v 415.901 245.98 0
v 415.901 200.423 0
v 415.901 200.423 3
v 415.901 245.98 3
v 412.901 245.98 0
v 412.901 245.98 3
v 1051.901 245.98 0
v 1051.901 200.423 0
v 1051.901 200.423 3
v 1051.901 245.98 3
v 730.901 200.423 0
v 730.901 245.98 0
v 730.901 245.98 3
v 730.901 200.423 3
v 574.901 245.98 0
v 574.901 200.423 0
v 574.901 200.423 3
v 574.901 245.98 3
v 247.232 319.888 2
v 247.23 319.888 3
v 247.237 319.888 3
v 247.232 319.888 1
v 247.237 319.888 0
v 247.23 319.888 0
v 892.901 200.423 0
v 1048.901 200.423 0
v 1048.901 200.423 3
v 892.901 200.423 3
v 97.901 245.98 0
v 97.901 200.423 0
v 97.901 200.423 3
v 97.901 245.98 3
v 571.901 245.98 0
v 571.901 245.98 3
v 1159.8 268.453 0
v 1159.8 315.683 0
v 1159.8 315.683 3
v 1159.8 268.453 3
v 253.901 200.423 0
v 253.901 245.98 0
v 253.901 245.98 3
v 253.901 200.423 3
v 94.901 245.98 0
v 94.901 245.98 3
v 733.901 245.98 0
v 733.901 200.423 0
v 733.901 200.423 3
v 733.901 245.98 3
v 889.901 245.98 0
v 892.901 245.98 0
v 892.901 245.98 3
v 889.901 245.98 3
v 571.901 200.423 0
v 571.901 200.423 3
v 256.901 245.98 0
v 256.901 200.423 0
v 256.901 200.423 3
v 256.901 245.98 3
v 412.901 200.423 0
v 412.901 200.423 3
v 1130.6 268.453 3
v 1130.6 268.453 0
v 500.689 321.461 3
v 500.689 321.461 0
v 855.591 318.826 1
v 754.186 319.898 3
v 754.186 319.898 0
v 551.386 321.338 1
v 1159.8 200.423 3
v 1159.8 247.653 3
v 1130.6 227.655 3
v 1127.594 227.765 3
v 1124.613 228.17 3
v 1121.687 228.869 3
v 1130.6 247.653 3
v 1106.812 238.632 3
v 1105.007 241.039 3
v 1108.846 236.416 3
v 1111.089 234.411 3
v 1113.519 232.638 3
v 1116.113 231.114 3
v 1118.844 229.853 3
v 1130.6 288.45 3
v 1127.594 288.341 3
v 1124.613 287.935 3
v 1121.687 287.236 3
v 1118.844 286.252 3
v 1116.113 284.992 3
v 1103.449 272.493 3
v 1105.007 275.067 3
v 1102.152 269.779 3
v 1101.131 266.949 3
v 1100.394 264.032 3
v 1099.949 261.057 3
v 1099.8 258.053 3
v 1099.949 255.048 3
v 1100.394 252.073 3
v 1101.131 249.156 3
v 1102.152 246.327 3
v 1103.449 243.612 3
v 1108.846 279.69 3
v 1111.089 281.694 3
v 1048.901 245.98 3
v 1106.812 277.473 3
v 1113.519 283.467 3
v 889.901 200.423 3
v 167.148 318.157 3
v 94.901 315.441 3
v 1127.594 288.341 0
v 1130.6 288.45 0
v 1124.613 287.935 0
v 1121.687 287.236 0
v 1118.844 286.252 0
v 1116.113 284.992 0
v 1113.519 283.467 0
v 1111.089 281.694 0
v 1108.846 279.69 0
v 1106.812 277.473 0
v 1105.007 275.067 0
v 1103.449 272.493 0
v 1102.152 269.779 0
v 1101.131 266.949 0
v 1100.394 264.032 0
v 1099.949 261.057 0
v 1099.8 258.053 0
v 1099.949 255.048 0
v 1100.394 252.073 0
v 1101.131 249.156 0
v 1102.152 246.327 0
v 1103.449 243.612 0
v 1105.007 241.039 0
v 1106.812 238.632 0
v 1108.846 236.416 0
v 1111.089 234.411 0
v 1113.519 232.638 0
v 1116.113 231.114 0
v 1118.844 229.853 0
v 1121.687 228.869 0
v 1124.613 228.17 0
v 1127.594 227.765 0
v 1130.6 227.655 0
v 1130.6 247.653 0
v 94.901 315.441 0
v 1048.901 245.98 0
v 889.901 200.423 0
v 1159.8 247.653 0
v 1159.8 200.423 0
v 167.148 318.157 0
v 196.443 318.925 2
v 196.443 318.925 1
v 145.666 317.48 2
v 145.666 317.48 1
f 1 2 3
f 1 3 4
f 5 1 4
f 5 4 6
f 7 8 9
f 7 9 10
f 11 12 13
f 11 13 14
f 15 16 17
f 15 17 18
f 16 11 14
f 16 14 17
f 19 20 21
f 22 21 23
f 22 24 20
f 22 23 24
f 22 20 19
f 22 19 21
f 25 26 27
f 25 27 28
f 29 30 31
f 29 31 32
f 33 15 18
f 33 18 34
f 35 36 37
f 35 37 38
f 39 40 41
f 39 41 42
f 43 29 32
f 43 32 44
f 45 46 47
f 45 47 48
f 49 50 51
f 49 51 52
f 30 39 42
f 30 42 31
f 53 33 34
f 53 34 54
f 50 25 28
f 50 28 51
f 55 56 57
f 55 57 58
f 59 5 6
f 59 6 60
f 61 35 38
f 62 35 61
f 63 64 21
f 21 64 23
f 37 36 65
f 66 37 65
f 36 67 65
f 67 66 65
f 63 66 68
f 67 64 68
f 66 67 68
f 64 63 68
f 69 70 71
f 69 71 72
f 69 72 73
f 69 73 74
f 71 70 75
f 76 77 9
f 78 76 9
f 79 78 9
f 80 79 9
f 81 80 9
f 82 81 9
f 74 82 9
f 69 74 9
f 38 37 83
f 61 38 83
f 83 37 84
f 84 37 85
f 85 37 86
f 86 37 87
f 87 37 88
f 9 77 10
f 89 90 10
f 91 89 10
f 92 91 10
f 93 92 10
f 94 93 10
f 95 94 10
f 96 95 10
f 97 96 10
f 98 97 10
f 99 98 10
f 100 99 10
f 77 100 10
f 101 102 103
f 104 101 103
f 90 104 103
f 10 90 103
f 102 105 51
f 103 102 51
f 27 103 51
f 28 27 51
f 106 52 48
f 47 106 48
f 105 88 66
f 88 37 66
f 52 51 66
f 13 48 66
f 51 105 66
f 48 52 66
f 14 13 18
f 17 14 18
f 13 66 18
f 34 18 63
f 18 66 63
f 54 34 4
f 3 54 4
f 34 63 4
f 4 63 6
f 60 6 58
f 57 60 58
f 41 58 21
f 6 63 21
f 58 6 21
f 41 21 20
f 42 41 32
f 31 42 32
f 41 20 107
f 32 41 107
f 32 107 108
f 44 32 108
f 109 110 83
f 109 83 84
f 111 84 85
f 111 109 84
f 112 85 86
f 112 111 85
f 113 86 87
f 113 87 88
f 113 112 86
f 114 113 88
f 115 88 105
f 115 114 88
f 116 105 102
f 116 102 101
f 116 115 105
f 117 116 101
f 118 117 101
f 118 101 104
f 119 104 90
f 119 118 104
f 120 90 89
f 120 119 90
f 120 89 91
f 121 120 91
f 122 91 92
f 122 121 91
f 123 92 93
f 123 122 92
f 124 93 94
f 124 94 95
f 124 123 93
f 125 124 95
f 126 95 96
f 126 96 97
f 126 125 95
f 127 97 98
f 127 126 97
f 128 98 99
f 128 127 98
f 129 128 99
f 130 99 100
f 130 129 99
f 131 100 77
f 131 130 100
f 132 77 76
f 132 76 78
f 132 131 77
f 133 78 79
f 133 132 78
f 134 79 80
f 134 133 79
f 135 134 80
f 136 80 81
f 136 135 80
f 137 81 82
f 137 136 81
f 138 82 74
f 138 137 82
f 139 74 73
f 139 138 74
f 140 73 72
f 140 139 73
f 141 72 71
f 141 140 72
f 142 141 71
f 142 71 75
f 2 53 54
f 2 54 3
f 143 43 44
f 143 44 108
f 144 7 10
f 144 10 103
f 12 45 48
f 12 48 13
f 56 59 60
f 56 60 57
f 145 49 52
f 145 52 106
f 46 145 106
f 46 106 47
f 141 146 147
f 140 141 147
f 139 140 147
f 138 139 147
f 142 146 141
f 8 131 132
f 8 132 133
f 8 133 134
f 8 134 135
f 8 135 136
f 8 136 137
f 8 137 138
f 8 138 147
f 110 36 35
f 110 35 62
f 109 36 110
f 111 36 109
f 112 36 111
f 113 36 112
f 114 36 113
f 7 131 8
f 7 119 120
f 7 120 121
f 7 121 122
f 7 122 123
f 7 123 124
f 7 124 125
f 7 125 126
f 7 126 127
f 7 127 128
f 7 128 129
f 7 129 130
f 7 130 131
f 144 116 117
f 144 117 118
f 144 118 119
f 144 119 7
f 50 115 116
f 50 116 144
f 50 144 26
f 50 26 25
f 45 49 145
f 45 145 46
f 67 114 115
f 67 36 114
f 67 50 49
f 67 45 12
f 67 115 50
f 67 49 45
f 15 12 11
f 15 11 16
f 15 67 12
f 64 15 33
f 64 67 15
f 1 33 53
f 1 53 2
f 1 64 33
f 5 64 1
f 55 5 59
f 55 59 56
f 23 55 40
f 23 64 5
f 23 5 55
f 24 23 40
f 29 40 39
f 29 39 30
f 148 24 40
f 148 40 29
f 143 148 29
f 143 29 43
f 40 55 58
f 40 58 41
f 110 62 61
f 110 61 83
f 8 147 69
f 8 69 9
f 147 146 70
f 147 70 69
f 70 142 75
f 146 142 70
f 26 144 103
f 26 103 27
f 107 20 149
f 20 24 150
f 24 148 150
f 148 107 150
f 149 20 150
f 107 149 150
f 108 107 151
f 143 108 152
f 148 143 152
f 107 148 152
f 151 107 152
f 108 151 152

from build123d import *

# Parameters (mm, degrees)
BOSS_EXTRUDE1_DEPTH = 3


with BuildPart() as part:
    # Model → Boss-Extrude1 (new body)
    with BuildSketch(Plane.XY):
        with BuildLine():
            Line((1159.8, 315.682652611), (1159.8, 268.452661621))
            Line((1159.8, 268.452661621), (1130.6, 268.452661621))
            Line((1130.6, 268.452661621), (1130.6, 288.450029928))
            ThreePointArc((1130.6, 288.450029928), (1099.799999997, 258.052661621), (1130.6, 227.655293314))
            Line((1130.6, 227.655293314), (1130.6, 247.652661621))
            Line((1130.6, 247.652661621), (1159.8, 247.652661621))
            Line((1159.8, 247.652661621), (1159.8, 200.422661621))
            Line((1159.8, 200.422661621), (1051.901037795, 200.422661621))
            Line((1051.901037795, 200.422661621), (1051.901037795, 245.979700014))
            Line((1051.901037795, 245.979700014), (1048.901037796, 245.979700014))
            Line((1048.901037796, 245.979700014), (1048.901037796, 200.422661621))
            Line((1048.901037796, 200.422661621), (892.901037795, 200.422661621))
            Line((892.901037795, 200.422661621), (892.901037795, 245.979700014))
            Line((892.901037795, 245.979700014), (889.901037795, 245.979700014))
            Line((889.901037795, 245.979700014), (889.901037795, 200.422661621))
            Line((889.901037795, 200.422661621), (733.901037795, 200.422661621))
            Line((733.901037795, 200.422661621), (733.901037795, 245.979700014))
            Line((733.901037795, 245.979700014), (730.901037795, 245.979700014))
            Line((730.901037795, 245.979700014), (730.901037795, 200.422661621))
            Line((730.901037795, 200.422661621), (574.901037795, 200.422661621))
            Line((574.901037795, 200.422661621), (574.901037795, 245.979700014))
            Line((574.901037795, 245.979700014), (571.901037795, 245.979700014))
            Line((571.901037795, 245.979700014), (571.901037795, 200.422661621))
            Line((571.901037795, 200.422661621), (415.901037795, 200.422661621))
            Line((415.901037795, 200.422661621), (415.901037795, 245.979700014))
            Line((415.901037795, 245.979700014), (412.901037795, 245.979700014))
            Line((412.901037795, 245.979700014), (412.901037795, 200.422661621))
            Line((412.901037795, 200.422661621), (256.901037795, 200.422661621))
            Line((256.901037795, 200.422661621), (256.901037795, 245.979700014))
            Line((256.901037795, 245.979700014), (253.901037796, 245.979700014))
            Line((253.901037796, 245.979700014), (253.901037796, 200.422661621))
            Line((253.901037796, 200.422661621), (97.901037796, 200.422661621))
            Line((97.901037796, 200.422661621), (97.901037796, 245.979700014))
            Line((97.901037796, 245.979700014), (94.901037796, 245.979700014))
            Line((94.901037796, 245.979700014), (94.901037796, 315.441313757))
            add(Edge.make_bspline(
                [(247.229949675, 319.88819474), (196.438413442, 319.129990608), (145.658637693, 317.812733824), (94.901037796, 315.441313757)],
                knots=[0, 0, 0, 0, 1, 1, 1, 1], degree=3))
            add(Edge.make_bspline(
                [(247.229949675, 319.88819474), (247.232310837, 319.888229986), (247.234672013, 319.888265232), (247.237033201, 319.888300477)],
                knots=[0.554606396, 0.554606396, 0.554606396, 0.554606396, 0.554611125, 0.554611125, 0.554611125, 0.554611125], degree=3))
            add(Edge.make_bspline(
                [(1159.8, 315.682652611), (855.607338384, 318.03324125), (551.339710355, 324.427563161), (247.237033201, 319.888300477)],
                knots=[0, 0, 0, 0, 1, 1, 1, 1], degree=3))
        make_face()
    extrude(amount=BOSS_EXTRUDE1_DEPTH)


solid = part.part
